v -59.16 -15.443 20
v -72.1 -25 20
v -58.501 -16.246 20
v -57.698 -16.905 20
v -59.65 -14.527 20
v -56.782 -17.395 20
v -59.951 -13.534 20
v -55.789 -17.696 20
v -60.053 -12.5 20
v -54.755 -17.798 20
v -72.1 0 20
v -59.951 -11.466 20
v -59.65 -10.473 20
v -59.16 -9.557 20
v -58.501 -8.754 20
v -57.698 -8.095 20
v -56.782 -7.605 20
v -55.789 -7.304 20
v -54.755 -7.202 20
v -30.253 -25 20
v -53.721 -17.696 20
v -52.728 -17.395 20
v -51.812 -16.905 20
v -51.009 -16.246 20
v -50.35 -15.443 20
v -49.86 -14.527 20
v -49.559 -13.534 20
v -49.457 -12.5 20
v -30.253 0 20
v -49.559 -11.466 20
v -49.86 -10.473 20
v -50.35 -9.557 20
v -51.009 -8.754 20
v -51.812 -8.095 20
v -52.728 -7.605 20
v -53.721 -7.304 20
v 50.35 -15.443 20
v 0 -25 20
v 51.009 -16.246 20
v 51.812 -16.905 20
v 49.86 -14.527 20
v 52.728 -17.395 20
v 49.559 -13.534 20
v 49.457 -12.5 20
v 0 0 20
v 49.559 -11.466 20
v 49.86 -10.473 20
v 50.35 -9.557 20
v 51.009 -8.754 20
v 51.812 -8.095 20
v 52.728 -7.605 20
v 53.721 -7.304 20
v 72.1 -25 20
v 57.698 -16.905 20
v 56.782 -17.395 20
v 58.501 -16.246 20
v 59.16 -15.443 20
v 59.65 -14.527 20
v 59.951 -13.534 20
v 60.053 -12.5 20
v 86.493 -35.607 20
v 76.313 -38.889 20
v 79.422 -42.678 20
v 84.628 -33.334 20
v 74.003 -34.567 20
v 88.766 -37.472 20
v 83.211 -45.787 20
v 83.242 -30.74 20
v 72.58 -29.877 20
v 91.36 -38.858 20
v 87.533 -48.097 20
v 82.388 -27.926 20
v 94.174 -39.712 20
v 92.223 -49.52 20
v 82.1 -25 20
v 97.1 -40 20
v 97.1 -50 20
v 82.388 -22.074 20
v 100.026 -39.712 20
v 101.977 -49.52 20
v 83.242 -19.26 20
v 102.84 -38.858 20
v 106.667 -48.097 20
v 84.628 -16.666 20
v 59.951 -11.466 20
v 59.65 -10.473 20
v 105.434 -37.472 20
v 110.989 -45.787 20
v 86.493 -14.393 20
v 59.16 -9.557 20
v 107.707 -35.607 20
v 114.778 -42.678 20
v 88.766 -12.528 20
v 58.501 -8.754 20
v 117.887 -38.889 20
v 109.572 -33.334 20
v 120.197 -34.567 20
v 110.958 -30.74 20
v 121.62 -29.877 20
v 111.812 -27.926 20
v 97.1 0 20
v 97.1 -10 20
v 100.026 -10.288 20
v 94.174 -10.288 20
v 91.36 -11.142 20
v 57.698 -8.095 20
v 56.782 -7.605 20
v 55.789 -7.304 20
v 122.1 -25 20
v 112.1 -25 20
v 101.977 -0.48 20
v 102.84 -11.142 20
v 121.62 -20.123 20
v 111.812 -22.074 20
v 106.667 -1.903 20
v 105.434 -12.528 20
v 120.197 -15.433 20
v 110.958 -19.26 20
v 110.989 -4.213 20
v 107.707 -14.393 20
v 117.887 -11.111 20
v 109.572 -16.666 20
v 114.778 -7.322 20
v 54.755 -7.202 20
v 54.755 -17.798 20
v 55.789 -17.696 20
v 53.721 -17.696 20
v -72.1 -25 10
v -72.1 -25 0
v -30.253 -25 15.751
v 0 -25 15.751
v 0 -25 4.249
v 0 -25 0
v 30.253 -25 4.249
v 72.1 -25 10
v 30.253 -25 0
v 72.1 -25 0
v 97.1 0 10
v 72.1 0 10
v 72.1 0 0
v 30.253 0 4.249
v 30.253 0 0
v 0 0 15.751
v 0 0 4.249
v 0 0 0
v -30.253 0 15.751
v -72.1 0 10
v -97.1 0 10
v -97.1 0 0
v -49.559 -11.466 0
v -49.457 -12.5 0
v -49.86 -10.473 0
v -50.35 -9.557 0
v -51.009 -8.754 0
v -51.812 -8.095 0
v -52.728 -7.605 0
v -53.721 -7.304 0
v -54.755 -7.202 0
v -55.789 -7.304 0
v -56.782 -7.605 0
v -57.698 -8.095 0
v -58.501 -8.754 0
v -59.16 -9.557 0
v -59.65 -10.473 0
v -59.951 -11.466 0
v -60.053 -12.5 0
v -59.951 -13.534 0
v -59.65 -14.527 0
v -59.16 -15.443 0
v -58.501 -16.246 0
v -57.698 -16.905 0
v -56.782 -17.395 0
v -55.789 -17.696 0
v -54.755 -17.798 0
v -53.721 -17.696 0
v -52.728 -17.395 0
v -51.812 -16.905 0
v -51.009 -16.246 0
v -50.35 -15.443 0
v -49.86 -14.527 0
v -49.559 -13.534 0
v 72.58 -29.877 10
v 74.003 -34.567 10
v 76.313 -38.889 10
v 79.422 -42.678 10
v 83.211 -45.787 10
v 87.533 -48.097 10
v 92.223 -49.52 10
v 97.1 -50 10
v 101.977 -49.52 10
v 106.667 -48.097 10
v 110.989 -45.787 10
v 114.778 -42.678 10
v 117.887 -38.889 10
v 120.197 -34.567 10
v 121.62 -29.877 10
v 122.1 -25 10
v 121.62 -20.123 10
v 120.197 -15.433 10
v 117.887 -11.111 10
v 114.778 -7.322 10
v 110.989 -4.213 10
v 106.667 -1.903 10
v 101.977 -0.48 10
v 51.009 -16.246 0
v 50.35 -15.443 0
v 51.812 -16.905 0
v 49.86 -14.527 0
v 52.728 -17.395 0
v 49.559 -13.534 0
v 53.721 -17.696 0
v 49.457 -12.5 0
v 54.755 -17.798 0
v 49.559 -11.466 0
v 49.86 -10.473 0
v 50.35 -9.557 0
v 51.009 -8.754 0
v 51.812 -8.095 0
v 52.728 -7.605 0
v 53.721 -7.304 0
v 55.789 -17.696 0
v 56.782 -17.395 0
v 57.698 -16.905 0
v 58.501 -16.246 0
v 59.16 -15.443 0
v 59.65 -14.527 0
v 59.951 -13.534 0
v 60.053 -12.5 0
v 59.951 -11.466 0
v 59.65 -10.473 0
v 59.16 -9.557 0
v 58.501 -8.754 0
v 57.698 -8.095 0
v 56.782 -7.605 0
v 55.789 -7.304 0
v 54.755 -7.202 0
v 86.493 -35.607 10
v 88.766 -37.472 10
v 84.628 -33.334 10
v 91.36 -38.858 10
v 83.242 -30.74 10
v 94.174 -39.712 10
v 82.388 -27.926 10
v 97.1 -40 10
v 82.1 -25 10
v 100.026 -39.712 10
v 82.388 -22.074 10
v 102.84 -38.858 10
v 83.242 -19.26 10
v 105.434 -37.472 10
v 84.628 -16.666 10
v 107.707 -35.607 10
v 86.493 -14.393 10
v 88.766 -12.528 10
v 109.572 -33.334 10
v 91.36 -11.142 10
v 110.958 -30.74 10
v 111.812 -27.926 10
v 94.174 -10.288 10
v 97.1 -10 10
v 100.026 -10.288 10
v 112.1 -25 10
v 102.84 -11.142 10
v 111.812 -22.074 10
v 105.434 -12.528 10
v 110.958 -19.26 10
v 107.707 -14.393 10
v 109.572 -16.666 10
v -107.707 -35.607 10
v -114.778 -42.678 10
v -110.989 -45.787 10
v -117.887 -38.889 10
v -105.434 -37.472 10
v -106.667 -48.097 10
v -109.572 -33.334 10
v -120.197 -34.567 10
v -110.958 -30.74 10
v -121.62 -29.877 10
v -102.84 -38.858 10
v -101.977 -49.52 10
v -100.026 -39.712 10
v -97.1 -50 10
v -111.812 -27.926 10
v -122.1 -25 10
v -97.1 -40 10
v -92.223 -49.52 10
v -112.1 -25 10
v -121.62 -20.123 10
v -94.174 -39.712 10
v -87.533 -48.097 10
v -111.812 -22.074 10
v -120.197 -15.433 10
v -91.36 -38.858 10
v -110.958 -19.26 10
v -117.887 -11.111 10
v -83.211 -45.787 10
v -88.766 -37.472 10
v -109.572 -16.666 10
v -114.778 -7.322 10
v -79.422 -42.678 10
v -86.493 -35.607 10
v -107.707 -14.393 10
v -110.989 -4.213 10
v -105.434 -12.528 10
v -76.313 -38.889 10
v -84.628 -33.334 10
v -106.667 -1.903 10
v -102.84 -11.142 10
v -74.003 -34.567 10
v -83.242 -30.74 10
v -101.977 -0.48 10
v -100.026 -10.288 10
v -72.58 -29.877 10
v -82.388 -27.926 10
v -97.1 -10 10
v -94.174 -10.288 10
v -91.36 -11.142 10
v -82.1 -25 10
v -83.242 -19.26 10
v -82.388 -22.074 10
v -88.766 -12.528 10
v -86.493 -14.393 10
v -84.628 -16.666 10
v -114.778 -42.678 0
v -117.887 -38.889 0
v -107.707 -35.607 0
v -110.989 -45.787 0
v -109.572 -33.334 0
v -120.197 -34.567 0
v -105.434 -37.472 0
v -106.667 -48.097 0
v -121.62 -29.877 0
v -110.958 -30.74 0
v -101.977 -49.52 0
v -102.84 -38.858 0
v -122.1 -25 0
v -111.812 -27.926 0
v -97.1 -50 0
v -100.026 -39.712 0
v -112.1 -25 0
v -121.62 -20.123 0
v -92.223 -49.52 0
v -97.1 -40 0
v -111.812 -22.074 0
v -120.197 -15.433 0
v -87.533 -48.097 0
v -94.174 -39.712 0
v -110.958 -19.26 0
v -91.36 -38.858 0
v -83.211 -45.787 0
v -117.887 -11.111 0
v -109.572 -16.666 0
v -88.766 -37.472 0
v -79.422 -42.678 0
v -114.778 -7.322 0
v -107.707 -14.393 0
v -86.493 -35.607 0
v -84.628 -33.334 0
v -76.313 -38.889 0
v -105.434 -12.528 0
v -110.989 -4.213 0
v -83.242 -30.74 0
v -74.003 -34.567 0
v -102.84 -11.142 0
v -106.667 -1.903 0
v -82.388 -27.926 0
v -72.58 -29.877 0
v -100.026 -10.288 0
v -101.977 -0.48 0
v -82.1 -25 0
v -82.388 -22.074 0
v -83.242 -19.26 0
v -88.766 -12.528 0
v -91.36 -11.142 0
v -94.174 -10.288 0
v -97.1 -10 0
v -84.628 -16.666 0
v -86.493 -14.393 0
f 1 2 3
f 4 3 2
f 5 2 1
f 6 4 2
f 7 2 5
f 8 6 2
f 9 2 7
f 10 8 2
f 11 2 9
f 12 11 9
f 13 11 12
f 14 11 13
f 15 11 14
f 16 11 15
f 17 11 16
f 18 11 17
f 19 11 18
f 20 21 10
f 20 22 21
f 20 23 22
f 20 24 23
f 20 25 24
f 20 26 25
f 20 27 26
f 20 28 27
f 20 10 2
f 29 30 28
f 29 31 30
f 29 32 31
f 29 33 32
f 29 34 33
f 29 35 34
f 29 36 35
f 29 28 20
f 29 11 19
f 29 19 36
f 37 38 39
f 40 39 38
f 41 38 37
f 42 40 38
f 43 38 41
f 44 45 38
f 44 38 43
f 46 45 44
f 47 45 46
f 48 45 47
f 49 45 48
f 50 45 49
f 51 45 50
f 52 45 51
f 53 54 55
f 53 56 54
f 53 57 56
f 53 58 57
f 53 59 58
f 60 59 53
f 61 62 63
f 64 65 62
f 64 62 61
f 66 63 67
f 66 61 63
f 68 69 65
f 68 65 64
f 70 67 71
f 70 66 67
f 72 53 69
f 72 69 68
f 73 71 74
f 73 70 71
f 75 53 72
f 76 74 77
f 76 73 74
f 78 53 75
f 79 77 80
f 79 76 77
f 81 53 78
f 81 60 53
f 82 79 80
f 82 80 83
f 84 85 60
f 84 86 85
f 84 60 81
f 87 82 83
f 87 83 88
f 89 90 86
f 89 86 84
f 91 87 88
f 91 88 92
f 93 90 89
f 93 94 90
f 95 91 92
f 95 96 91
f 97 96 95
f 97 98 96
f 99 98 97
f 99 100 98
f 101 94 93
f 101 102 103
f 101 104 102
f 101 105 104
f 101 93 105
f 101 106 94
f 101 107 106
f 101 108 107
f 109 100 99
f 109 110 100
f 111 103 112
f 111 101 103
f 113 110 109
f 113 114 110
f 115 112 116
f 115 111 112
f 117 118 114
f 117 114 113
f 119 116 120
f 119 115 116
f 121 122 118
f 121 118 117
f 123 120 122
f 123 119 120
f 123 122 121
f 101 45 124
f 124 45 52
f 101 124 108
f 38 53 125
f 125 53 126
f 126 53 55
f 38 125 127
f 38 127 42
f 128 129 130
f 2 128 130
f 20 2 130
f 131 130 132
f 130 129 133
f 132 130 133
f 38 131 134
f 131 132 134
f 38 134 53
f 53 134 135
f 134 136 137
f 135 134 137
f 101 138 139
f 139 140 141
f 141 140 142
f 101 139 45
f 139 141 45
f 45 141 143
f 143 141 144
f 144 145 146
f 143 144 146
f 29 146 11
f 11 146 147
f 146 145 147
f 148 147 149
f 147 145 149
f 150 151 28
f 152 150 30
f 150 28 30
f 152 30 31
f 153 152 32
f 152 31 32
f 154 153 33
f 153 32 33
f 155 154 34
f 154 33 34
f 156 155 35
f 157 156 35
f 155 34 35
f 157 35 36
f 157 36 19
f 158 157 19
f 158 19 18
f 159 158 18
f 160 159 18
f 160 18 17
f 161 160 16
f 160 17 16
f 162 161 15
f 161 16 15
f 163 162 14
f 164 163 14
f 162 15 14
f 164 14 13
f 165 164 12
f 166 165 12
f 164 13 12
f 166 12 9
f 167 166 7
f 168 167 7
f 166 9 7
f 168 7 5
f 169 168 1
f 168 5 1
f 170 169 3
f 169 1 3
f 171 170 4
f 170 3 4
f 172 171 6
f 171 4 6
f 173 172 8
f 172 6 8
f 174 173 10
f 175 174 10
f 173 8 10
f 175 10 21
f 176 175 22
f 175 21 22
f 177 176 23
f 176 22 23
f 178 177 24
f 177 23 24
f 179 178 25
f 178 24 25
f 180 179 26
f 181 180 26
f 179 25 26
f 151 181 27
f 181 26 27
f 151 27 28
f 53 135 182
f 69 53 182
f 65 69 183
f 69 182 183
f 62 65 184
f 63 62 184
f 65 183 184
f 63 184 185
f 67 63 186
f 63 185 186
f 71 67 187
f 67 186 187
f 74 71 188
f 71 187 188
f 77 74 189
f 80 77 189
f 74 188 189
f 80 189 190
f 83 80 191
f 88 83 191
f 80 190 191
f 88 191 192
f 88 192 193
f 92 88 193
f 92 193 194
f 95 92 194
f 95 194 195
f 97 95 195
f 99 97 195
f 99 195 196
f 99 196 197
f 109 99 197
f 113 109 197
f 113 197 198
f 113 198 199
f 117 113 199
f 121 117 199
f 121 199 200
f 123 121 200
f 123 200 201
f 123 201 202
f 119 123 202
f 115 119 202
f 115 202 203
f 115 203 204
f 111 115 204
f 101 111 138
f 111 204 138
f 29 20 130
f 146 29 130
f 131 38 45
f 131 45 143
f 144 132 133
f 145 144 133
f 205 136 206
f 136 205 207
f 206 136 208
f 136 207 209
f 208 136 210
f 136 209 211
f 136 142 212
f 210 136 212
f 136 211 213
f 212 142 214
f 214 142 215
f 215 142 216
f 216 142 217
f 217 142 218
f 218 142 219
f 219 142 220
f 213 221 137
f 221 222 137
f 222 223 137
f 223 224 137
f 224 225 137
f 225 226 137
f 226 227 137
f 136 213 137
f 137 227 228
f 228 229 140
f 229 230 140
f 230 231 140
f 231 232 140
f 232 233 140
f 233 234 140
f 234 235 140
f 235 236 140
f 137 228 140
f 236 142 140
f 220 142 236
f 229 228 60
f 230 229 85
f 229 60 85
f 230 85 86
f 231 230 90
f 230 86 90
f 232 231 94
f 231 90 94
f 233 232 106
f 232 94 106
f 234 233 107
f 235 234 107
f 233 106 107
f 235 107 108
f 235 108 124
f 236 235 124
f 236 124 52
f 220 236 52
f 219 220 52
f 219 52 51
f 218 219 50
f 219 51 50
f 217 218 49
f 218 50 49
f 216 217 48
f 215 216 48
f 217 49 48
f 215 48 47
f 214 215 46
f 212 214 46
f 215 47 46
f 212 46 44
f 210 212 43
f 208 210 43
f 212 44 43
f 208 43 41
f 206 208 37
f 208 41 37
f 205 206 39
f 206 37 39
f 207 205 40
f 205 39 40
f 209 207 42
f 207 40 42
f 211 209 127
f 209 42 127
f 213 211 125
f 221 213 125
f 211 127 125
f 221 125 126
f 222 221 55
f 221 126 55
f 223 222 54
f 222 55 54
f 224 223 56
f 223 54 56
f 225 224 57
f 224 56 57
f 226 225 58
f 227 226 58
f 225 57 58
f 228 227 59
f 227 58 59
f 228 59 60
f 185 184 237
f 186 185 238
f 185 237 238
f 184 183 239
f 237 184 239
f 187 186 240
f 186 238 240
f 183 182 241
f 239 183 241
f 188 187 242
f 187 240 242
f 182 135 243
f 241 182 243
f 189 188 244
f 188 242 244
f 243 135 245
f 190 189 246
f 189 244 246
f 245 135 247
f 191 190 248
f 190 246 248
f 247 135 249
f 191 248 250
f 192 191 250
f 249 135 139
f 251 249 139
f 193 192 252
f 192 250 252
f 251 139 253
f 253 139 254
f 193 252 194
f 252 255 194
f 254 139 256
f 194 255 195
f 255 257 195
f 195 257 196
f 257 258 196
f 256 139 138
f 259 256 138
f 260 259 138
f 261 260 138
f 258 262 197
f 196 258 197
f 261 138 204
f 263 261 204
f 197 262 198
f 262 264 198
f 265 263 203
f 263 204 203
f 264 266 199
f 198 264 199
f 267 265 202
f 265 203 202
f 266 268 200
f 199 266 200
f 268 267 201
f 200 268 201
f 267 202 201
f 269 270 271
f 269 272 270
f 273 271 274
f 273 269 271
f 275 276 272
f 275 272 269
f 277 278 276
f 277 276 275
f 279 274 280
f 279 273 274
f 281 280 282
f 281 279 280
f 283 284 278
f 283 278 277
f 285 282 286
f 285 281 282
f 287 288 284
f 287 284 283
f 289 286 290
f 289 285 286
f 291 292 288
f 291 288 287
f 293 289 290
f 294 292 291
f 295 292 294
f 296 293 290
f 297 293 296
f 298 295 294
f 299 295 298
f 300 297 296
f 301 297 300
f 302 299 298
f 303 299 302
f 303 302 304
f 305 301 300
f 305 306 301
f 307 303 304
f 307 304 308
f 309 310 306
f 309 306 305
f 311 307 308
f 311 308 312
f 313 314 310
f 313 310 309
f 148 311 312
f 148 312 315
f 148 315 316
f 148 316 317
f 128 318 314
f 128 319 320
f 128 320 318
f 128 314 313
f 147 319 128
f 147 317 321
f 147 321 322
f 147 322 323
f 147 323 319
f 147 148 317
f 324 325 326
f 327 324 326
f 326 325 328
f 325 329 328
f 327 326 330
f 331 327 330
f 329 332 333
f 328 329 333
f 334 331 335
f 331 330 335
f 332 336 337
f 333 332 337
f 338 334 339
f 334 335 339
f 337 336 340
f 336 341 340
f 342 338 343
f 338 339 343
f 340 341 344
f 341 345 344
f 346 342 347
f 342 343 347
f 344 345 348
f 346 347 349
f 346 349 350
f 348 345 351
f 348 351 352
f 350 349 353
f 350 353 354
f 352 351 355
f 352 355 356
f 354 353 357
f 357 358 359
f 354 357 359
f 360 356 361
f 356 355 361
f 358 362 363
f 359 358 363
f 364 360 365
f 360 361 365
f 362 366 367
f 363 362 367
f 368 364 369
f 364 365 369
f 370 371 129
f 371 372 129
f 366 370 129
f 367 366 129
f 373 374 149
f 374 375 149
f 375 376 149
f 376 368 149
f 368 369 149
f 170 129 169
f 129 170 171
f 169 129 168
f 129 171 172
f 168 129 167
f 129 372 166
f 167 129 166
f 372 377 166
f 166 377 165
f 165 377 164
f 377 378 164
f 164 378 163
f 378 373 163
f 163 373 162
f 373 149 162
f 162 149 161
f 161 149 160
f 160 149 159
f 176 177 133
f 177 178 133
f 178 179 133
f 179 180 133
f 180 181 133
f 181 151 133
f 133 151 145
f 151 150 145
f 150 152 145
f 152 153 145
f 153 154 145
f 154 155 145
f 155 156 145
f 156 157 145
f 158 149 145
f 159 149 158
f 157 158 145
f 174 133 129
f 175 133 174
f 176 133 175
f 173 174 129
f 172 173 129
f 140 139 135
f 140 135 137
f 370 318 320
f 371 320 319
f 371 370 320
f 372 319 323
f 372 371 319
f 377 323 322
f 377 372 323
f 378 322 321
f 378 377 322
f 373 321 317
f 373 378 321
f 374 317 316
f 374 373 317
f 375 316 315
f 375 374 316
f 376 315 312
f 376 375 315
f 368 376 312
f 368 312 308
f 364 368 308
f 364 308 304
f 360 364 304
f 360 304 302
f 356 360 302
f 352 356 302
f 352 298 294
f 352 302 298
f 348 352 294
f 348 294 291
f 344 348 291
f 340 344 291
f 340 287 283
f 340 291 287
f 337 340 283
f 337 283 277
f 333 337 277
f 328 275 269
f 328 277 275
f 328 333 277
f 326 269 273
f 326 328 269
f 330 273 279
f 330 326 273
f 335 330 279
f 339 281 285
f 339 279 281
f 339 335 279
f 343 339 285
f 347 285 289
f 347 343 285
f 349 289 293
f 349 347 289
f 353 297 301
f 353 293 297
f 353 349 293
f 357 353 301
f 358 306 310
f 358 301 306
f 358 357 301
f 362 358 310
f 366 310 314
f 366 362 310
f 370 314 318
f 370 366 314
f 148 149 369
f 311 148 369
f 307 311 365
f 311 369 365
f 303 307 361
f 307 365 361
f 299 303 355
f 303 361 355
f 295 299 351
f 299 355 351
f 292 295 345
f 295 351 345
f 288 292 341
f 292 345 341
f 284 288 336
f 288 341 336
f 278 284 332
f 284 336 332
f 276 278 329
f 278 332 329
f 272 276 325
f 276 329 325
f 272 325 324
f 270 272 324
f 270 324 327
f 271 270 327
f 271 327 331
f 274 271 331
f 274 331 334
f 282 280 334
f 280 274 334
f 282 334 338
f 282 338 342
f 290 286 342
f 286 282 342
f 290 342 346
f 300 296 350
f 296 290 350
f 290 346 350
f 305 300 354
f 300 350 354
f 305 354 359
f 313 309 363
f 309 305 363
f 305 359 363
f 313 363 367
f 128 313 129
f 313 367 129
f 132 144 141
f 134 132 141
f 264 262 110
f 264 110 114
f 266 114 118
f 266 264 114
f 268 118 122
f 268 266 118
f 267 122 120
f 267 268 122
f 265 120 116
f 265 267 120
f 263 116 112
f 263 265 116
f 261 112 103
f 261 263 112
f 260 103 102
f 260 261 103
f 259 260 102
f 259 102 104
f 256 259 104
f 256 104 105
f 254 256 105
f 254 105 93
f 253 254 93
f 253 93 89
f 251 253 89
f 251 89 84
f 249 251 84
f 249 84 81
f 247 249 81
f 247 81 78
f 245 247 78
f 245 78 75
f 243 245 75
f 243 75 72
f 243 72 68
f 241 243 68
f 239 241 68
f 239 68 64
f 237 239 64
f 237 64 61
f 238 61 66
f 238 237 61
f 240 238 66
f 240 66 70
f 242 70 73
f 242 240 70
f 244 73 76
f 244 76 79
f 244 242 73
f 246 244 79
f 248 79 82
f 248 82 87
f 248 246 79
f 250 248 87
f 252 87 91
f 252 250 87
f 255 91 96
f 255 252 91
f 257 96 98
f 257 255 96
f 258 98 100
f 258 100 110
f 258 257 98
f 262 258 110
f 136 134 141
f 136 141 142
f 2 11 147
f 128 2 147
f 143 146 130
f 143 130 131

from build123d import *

# Parameters (mm, degrees)
SKETCH1_R           = 15
BOSS_EXTRUDE1_DEPTH = 20
SKETCH2_W           = 50
SKETCH2_H           = 10
CUT_EXTRUDE1_DEPTH  = 84
SKETCH3_R           = 5.297885383
CUT_EXTRUDE2_DEPTH  = 20
SKETCH4_W           = 30.252743008
SKETCH4_H           = 4.249478602
CUT_EXTRUDE3_DEPTH  = 31


with BuildPart() as part:
    # Sketch1 → Boss-Extrude1 (new body)
    with BuildSketch(Plane.XY):
        with BuildLine():
            Line((-72.1, -25), (72.1, -25))
            ThreePointArc((72.1, -25), (114.77766953, -42.67766953), (97.1, 0))
            Line((97.1, 0), (-97.1, 0))
            ThreePointArc((-97.1, 0), (-114.77766953, -42.67766953), (-72.1, -25))
        make_face()
        with Locations((-97.1, -25)):
            Circle(SKETCH1_R, mode=Mode.SUBTRACT)
        with Locations((97.1, -25)):
            Circle(SKETCH1_R, mode=Mode.SUBTRACT)
    extrude(amount=BOSS_EXTRUDE1_DEPTH)

    # Sketch2 → Cut-Extrude1 (cut)
    with BuildSketch(Plane(origin=(0, 0, 0), x_dir=(1, 0, 0), z_dir=(0, 1, 0))):
        with Locations((97.1, -5)):
            Rectangle(SKETCH2_W, SKETCH2_H)
        with Locations((-97.1, -15)):
            Rectangle(SKETCH2_W, SKETCH2_H)
    extrude(amount=-CUT_EXTRUDE1_DEPTH, mode=Mode.SUBTRACT)

    # Sketch3 → Cut-Extrude2 (cut)
    with BuildSketch(Plane.XY.offset(20)):
        with Locations((-54.754964617, -12.5)):
            Circle(SKETCH3_R)
        with Locations((54.754964617, -12.5)):
            Circle(SKETCH3_R)
    extrude(amount=-CUT_EXTRUDE2_DEPTH, mode=Mode.SUBTRACT)

    # Sketch4 → Cut-Extrude3 (cut)
    with BuildSketch(Plane(origin=(0, 0, 0), x_dir=(1, 0, 0), z_dir=(0, 1, 0))):
        with Locations((-15.126371504, -17.875260699)):
            Rectangle(SKETCH4_W, SKETCH4_H)
        with Locations((15.126371504, -2.124739301)):
            Rectangle(SKETCH4_W, SKETCH4_H)
    extrude(amount=-CUT_EXTRUDE3_DEPTH, mode=Mode.SUBTRACT)


solid = part.part
